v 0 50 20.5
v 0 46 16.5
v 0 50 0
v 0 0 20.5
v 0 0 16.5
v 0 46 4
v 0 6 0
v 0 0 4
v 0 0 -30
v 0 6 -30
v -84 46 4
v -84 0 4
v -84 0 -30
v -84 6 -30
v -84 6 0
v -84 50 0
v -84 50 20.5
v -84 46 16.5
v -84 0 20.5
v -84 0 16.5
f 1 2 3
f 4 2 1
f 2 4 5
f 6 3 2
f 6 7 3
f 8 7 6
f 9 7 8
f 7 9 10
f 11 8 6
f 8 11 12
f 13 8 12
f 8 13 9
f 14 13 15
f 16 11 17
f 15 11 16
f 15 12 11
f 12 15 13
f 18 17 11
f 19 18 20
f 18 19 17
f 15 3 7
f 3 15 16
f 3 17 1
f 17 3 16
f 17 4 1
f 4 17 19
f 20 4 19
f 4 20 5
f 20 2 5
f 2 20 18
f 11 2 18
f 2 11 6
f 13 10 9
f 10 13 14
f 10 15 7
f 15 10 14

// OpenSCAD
// 8-tube PCR strip holder that hooks over a 12 mm bucket wall
// Printed as used: rests on XY plane (z=0), builds upward (+Z), centred on x=0.
// Profile is in the YZ plane, extruded 84 mm along X.

$fn = 64;

// ---- Overall extrusion (X direction) ----
L = 84;          // extrusion length along X (centred on x=0)

// ---- Upside-down U profile (YZ plane) ----
z0 = 0;          // bottom of legs (sits on XY plane)
z1 = 50;        // top of legs / bridge
y_inner_lo = 0;  // inner leg, low Y
y_inner_hi = 4;  // inner leg, high Y  (4 mm thick)
y_outer_lo = 16.5; // outer leg, low Y
y_outer_hi = 20.5; // outer leg, high Y (4 mm thick)
z_bridge_lo = 46;  // bridge bottom (leaves 12.5 mm gap for 12 mm wall)
z_bridge_hi = 50;  // bridge top

// ---- Flat ledge (into the ice, toward -Y) ----
y_ledge_lo = -30; // ledge extends from y=0 to y=-30
y_ledge_hi = 0;
z_ledge_lo = 0;   // 6 mm thick ledge
z_ledge_hi = 6;

// ---- Tube holes ----
hole_d = 6.4;    // through-hole diameter
hole_pitch = 9;  // spacing along X
n_holes = 8;     // number of holes
y_hole = -15;    // hole centre Y

// ---- Build the solid ----
difference() {
    // Rotate so the extrusion (originally +Z) becomes +X,
    // and the profile's local X (Y-coord) becomes Y, local Y (Z-coord) becomes Z.
    rotate([0, -90, 0])
    union() {
        // Inner leg
        linear_extrude(L)
            polygon([
                [y_inner_lo, z0],
                [y_inner_hi, z0],
                [y_inner_hi, z1],
                [y_inner_lo, z1]
            ]);

        // Outer leg
        linear_extrude(L)
            polygon([
                [y_outer_lo, z0],
                [y_outer_hi, z0],
                [y_outer_hi, z1],
                [y_outer_lo, z1]
            ]);

        // Bridge joining the two legs at the top
        linear_extrude(L)
            polygon([
                [y_inner_lo, z_bridge_lo],
                [y_outer_hi, z_bridge_lo],
                [y_outer_hi, z_bridge_hi],
                [y_inner_lo, z_bridge_hi]
            ]);

        // Flat ledge reaching toward -Y from the foot of the inner leg
        linear_extrude(L)
            polygon([
                [y_ledge_lo, z_ledge_lo],
                [y_ledge_hi, z_ledge_lo],
                [y_ledge_hi, z_ledge_hi],
                [y_ledge_lo, z_ledge_hi]
            ]);
    }

    // Eight vertical 6.4 mm through-holes in the ledge, 9 mm apart along X, centred, at y=-15
    for (i = [0 : n_holes - 1]) {
        x_hole = (i - (n_holes - 1) / 2) * hole_pitch;
        translate([x_hole, y_hole, z_ledge_lo - 1])
            cylinder(h = (z_ledge_hi - z_ledge_lo) + 2, r = hole_d / 2, $fn = 64);
    }
}
